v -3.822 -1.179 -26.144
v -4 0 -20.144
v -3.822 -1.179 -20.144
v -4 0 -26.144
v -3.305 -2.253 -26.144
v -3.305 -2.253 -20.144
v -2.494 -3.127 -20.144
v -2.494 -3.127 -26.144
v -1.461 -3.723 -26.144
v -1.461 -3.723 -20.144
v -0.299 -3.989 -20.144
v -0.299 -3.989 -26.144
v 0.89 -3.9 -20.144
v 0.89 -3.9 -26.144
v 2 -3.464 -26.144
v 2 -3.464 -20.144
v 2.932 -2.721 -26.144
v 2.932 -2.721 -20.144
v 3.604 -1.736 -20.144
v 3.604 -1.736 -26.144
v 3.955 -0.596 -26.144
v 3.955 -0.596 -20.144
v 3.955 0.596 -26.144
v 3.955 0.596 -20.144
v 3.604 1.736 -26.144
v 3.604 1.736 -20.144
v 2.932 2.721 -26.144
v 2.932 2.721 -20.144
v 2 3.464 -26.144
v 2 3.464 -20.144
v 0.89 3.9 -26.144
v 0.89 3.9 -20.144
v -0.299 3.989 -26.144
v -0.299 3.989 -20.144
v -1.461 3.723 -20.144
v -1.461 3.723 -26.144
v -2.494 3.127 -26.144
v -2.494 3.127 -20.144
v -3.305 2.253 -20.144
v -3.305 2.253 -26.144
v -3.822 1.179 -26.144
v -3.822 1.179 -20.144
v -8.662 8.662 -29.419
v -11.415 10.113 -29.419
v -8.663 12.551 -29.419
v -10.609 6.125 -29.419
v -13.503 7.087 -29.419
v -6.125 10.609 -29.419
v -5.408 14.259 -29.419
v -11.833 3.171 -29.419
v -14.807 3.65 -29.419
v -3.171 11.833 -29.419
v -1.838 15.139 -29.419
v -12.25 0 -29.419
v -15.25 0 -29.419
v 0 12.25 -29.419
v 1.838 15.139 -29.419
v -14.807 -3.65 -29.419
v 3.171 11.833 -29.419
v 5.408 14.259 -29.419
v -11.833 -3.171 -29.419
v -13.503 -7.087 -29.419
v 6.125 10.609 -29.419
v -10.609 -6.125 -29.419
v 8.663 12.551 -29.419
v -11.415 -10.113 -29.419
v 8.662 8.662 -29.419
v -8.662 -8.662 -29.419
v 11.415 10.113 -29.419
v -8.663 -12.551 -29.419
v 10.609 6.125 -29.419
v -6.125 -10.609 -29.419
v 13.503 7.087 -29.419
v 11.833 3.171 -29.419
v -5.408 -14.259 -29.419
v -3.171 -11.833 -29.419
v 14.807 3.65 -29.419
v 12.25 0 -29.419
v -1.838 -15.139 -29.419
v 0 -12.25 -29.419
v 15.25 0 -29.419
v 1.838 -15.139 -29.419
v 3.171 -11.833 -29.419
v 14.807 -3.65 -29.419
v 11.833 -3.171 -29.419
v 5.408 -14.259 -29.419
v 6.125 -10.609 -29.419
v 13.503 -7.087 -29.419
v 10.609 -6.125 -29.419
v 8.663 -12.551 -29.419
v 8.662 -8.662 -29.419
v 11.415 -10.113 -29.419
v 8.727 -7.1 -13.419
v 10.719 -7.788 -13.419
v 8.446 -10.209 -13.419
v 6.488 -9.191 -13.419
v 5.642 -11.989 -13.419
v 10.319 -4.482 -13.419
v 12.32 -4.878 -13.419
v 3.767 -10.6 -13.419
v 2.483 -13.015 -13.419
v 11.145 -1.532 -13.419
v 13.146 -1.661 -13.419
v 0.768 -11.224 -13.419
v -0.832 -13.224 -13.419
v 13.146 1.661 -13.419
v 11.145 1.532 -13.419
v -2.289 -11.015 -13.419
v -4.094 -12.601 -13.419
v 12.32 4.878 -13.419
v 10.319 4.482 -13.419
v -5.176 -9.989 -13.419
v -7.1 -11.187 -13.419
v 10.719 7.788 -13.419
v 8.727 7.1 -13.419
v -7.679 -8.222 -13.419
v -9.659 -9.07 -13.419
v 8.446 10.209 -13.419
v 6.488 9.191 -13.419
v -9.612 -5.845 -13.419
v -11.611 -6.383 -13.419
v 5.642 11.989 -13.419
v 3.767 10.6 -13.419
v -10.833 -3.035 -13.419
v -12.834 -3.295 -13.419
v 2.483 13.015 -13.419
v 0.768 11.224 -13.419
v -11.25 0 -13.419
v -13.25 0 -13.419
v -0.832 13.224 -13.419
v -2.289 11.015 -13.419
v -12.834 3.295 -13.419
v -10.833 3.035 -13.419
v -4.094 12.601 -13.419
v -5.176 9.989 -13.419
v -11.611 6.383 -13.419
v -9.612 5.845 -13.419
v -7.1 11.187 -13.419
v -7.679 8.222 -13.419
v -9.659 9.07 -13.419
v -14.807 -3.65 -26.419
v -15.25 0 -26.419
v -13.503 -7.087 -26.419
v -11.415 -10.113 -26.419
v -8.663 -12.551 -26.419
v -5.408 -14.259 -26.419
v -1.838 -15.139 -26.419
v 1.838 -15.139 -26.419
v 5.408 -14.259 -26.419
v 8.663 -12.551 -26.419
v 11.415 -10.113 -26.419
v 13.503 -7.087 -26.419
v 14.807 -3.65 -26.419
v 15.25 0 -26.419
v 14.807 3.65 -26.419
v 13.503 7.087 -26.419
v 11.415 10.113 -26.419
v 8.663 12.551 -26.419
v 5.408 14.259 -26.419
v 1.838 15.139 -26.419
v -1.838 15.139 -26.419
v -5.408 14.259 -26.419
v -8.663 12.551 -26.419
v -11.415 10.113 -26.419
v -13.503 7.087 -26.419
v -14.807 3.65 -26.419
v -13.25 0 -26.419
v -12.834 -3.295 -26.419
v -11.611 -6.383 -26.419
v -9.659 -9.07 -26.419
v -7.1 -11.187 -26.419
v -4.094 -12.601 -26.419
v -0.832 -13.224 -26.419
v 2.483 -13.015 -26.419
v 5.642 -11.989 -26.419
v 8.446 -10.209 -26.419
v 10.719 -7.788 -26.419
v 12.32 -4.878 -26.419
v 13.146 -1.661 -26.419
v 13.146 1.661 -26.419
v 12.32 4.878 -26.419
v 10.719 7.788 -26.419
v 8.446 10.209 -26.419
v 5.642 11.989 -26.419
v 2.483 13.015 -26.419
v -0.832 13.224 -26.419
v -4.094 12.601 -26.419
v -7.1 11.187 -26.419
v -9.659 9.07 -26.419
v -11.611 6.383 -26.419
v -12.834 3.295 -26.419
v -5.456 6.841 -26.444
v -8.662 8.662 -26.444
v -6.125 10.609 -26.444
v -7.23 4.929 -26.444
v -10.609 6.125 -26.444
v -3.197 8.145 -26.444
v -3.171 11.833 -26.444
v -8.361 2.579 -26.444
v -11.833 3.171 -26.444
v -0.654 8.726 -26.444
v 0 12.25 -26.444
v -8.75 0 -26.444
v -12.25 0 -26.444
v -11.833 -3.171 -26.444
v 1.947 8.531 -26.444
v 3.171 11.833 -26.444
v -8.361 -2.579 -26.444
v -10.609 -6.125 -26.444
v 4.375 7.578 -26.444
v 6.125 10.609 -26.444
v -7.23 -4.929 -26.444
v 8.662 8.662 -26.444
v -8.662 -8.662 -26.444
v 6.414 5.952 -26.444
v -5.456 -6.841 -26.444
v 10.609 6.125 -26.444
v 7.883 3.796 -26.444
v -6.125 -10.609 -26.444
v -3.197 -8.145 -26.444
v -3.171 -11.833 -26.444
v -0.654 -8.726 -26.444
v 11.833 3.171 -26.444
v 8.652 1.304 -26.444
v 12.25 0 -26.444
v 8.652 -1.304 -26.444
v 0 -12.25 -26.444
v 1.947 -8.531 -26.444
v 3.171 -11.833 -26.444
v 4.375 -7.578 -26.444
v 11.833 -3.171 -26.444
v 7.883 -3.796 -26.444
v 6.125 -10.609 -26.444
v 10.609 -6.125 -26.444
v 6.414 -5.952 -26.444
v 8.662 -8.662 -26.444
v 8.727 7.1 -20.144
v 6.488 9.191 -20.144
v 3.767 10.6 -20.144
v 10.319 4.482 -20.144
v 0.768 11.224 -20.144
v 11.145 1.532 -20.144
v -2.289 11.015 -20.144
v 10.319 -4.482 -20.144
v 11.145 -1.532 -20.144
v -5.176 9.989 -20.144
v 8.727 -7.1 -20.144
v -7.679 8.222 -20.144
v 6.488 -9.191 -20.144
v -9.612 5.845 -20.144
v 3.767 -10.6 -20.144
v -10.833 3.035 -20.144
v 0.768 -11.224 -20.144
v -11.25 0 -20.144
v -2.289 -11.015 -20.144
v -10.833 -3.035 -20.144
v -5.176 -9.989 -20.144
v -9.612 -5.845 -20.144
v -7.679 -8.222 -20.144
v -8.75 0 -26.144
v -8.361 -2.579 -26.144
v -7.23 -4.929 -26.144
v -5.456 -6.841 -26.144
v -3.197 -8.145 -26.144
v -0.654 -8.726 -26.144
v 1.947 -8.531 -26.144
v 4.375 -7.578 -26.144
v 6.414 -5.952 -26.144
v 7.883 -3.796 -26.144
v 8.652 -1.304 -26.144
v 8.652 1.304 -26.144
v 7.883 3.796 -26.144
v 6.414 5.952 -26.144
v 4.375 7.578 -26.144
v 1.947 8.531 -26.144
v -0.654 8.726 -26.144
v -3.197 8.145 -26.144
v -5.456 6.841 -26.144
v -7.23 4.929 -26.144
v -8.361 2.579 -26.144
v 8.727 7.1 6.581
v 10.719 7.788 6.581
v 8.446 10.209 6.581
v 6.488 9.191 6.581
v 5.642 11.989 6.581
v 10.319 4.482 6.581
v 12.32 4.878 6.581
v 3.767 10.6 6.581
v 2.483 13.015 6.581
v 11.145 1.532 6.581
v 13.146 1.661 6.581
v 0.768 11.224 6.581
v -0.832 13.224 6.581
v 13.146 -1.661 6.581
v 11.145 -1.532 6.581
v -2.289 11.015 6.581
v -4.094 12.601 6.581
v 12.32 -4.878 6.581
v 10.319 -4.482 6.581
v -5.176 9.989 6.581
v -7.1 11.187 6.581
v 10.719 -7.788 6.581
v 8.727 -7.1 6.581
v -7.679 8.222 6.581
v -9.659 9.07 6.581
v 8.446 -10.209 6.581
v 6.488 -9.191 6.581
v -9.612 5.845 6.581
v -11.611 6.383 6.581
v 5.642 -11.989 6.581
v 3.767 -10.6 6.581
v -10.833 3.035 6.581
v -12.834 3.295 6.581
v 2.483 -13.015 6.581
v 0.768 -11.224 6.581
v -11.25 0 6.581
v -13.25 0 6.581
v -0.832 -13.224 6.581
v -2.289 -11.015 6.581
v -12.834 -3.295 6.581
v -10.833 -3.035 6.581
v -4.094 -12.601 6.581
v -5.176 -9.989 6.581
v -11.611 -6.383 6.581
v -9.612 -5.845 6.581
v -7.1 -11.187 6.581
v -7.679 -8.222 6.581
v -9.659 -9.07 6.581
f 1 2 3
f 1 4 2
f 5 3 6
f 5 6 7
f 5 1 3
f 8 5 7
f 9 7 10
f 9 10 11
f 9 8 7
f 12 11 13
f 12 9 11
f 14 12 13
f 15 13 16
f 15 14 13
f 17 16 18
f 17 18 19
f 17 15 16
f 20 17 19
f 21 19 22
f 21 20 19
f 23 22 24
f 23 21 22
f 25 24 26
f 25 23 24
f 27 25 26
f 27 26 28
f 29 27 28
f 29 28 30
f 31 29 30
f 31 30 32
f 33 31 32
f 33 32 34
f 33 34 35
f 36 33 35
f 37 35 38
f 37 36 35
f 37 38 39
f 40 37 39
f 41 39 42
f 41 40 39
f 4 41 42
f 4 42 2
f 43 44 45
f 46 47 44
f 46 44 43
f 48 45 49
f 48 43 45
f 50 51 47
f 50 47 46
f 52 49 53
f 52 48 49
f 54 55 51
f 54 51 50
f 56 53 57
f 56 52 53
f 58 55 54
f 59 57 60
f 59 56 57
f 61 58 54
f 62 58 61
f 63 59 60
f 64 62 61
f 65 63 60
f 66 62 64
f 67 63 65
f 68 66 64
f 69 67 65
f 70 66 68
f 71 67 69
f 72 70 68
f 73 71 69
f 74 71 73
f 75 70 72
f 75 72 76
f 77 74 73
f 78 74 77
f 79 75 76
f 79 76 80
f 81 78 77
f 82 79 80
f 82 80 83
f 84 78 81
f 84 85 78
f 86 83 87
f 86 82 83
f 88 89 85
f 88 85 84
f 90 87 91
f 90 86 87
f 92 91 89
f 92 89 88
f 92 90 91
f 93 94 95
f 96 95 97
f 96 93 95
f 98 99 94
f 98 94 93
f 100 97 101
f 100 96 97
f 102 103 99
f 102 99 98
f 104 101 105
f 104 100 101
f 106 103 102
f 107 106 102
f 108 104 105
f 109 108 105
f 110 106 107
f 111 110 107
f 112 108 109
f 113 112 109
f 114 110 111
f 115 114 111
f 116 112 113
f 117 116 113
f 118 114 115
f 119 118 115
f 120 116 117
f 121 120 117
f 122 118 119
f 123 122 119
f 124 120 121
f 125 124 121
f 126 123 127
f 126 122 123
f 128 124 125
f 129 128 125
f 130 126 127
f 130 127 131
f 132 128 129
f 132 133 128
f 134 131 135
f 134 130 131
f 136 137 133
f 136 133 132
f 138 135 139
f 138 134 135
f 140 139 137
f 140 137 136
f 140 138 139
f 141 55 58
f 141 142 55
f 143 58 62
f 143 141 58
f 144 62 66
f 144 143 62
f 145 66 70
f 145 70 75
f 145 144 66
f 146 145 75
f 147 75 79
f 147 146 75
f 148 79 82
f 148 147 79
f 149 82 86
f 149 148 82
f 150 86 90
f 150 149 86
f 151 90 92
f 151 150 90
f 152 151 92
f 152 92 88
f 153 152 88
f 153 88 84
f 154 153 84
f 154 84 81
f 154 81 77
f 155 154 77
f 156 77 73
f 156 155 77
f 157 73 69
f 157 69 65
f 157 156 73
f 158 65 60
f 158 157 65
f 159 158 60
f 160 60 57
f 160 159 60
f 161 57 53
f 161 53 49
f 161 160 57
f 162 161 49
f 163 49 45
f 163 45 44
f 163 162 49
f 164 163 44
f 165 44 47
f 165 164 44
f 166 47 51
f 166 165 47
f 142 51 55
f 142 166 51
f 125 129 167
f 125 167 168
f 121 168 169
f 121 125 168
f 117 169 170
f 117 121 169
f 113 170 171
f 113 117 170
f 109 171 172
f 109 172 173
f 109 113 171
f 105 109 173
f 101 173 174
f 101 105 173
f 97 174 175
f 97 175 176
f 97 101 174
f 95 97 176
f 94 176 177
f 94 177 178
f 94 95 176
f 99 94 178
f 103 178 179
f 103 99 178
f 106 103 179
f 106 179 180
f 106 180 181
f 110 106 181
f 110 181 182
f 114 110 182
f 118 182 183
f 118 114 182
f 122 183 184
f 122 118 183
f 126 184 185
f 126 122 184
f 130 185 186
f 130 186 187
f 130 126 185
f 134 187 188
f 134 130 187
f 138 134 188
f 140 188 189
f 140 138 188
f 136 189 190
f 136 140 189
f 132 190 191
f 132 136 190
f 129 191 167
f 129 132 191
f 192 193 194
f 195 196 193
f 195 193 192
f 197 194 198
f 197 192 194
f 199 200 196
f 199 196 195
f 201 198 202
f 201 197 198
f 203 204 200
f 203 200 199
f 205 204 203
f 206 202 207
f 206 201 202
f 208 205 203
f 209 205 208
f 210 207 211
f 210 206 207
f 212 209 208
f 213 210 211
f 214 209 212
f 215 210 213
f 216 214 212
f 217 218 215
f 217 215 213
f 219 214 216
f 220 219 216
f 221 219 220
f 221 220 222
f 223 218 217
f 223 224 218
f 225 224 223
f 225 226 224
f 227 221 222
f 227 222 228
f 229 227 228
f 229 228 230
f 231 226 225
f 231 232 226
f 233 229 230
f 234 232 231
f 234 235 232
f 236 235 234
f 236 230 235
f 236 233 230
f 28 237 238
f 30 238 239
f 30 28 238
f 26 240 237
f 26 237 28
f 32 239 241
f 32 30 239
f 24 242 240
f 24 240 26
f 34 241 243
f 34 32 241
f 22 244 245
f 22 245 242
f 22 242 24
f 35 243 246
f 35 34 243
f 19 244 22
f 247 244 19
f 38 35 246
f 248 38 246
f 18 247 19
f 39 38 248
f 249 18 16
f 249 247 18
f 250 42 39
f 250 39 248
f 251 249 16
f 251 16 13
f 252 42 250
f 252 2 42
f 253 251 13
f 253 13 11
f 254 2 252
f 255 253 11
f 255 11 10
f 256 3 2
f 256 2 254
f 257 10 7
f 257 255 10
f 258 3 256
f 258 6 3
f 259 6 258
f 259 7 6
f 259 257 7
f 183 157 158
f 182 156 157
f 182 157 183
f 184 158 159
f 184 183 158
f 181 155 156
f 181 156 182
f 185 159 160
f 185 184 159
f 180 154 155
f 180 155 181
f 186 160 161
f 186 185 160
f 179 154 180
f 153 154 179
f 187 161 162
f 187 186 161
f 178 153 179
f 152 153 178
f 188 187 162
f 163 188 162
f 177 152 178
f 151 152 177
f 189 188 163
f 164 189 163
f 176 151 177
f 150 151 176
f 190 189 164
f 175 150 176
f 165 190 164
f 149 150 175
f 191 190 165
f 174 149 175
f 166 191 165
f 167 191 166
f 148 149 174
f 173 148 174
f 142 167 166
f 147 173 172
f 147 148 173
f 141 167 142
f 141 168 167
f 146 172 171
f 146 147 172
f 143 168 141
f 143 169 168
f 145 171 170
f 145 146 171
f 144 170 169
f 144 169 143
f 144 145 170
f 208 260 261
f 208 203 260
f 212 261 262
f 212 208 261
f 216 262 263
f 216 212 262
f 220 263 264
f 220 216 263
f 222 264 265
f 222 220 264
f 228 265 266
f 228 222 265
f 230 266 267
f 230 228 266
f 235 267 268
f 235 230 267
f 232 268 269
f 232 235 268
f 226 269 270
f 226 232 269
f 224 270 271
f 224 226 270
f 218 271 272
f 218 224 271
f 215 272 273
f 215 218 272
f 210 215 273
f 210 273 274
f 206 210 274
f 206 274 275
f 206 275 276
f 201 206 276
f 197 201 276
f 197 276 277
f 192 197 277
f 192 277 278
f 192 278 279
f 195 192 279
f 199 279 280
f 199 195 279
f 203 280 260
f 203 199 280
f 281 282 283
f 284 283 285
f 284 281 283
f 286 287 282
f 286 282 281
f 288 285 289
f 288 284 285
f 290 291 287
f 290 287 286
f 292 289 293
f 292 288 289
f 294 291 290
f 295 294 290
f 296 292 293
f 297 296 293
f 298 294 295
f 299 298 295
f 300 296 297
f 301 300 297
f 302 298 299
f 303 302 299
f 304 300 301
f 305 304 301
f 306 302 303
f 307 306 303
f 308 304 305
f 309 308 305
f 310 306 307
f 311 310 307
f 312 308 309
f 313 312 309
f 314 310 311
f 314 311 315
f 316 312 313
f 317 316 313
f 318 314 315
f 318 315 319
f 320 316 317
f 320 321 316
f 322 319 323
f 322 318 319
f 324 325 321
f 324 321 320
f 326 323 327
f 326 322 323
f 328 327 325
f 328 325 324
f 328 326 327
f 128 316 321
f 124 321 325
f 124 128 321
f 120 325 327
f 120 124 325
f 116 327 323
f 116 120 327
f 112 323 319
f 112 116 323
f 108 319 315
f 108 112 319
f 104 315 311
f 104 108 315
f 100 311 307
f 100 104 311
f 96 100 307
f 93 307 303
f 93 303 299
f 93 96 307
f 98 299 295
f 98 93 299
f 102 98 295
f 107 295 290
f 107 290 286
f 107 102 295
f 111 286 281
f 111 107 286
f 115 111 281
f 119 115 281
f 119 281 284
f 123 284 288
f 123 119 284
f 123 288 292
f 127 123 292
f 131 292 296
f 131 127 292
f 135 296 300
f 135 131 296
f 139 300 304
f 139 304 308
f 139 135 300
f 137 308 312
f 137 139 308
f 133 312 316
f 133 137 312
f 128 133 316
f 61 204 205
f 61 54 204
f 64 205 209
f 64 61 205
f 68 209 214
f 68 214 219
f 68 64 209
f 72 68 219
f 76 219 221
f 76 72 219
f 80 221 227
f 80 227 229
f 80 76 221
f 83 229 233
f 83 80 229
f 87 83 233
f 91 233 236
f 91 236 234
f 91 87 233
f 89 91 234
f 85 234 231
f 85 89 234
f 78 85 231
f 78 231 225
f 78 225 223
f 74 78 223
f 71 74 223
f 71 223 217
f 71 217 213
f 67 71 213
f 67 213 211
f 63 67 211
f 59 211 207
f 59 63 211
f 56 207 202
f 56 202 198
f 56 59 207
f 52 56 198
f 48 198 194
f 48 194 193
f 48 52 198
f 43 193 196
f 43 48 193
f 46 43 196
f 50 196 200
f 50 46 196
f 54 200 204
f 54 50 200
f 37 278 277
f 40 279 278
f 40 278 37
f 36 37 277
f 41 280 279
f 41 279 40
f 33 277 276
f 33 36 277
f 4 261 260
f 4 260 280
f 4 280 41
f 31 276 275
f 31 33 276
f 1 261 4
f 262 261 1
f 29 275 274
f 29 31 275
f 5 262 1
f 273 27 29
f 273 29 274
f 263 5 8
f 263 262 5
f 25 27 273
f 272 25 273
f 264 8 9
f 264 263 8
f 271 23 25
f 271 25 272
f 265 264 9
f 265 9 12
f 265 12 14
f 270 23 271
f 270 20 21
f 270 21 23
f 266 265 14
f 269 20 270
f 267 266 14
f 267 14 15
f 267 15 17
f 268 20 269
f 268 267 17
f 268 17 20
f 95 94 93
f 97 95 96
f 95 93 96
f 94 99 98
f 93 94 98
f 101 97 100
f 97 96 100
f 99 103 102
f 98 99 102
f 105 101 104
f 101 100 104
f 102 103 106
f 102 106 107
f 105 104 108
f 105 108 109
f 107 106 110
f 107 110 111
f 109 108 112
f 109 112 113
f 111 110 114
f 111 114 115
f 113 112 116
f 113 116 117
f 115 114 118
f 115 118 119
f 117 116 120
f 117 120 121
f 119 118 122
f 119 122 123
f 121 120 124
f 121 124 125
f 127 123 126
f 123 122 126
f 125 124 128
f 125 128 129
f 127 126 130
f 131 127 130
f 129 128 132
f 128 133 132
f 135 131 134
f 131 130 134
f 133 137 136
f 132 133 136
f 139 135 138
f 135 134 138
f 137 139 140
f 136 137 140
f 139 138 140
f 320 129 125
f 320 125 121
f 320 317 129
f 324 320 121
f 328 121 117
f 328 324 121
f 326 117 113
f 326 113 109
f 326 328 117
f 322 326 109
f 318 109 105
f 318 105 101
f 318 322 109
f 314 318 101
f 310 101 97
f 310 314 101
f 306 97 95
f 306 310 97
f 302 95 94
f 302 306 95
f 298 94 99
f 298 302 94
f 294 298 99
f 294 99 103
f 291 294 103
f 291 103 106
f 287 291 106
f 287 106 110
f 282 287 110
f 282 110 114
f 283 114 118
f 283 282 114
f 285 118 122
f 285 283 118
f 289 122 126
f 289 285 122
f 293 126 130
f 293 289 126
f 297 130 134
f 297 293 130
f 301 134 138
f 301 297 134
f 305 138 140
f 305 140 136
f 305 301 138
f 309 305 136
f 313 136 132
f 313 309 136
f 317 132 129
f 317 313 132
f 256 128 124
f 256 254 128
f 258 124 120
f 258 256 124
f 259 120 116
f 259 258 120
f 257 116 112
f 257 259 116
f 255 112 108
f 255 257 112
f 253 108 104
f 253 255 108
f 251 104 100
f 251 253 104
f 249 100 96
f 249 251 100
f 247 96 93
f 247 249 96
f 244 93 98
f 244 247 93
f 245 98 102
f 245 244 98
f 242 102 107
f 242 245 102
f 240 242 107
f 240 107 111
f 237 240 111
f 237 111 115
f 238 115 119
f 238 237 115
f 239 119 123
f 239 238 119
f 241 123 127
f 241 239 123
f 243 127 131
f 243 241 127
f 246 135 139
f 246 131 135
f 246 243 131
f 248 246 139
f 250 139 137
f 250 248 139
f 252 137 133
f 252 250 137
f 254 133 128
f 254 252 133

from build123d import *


with BuildPart() as part:
    # Croquis1 → Revolución1 (revolve)
    with BuildSketch(Plane(origin=(0, 0, 0), x_dir=(1, 0, 0), z_dir=(0, 1, 0)), mode=Mode.PRIVATE) as revoluci_n1_sk:
        Polygon((11.25, -6.580508167), (11.25, 20.143587236), (4, 20.143587236), (4, 26.143587236), (8.75, 26.143587236), (8.75, 26.443587236), (12.25, 26.443587236), (12.25, 29.419491833), (15.25, 29.419491833), (15.25, 26.419491833), (13.25, 26.419491833), (13.25, -6.580508167), align=None)
    revolve(revoluci_n1_sk.sketch.rotate(Axis((0, 0, -41.745454545), (0, 0, 1)), 180), axis=Axis((0, 0, -41.745454545), (0, 0, 1)))


with BuildPart() as body_2:
    # Partir1: the piece on the far side of the plane
    add(part.part)
    split(bisect_by=Plane(origin=(0, 0, -13.419491833), x_dir=(-1, 0, 0), z_dir=(0, 0, -1)), keep=Keep.BOTTOM)


with BuildPart() as part_1:
    add(part.part)

    # Partir1
    split(bisect_by=Plane(origin=(0, 0, -13.419491833), x_dir=(-1, 0, 0), z_dir=(0, 0, -1)), keep=Keep.TOP)


solid = Compound([body_2.part, part_1.part])
